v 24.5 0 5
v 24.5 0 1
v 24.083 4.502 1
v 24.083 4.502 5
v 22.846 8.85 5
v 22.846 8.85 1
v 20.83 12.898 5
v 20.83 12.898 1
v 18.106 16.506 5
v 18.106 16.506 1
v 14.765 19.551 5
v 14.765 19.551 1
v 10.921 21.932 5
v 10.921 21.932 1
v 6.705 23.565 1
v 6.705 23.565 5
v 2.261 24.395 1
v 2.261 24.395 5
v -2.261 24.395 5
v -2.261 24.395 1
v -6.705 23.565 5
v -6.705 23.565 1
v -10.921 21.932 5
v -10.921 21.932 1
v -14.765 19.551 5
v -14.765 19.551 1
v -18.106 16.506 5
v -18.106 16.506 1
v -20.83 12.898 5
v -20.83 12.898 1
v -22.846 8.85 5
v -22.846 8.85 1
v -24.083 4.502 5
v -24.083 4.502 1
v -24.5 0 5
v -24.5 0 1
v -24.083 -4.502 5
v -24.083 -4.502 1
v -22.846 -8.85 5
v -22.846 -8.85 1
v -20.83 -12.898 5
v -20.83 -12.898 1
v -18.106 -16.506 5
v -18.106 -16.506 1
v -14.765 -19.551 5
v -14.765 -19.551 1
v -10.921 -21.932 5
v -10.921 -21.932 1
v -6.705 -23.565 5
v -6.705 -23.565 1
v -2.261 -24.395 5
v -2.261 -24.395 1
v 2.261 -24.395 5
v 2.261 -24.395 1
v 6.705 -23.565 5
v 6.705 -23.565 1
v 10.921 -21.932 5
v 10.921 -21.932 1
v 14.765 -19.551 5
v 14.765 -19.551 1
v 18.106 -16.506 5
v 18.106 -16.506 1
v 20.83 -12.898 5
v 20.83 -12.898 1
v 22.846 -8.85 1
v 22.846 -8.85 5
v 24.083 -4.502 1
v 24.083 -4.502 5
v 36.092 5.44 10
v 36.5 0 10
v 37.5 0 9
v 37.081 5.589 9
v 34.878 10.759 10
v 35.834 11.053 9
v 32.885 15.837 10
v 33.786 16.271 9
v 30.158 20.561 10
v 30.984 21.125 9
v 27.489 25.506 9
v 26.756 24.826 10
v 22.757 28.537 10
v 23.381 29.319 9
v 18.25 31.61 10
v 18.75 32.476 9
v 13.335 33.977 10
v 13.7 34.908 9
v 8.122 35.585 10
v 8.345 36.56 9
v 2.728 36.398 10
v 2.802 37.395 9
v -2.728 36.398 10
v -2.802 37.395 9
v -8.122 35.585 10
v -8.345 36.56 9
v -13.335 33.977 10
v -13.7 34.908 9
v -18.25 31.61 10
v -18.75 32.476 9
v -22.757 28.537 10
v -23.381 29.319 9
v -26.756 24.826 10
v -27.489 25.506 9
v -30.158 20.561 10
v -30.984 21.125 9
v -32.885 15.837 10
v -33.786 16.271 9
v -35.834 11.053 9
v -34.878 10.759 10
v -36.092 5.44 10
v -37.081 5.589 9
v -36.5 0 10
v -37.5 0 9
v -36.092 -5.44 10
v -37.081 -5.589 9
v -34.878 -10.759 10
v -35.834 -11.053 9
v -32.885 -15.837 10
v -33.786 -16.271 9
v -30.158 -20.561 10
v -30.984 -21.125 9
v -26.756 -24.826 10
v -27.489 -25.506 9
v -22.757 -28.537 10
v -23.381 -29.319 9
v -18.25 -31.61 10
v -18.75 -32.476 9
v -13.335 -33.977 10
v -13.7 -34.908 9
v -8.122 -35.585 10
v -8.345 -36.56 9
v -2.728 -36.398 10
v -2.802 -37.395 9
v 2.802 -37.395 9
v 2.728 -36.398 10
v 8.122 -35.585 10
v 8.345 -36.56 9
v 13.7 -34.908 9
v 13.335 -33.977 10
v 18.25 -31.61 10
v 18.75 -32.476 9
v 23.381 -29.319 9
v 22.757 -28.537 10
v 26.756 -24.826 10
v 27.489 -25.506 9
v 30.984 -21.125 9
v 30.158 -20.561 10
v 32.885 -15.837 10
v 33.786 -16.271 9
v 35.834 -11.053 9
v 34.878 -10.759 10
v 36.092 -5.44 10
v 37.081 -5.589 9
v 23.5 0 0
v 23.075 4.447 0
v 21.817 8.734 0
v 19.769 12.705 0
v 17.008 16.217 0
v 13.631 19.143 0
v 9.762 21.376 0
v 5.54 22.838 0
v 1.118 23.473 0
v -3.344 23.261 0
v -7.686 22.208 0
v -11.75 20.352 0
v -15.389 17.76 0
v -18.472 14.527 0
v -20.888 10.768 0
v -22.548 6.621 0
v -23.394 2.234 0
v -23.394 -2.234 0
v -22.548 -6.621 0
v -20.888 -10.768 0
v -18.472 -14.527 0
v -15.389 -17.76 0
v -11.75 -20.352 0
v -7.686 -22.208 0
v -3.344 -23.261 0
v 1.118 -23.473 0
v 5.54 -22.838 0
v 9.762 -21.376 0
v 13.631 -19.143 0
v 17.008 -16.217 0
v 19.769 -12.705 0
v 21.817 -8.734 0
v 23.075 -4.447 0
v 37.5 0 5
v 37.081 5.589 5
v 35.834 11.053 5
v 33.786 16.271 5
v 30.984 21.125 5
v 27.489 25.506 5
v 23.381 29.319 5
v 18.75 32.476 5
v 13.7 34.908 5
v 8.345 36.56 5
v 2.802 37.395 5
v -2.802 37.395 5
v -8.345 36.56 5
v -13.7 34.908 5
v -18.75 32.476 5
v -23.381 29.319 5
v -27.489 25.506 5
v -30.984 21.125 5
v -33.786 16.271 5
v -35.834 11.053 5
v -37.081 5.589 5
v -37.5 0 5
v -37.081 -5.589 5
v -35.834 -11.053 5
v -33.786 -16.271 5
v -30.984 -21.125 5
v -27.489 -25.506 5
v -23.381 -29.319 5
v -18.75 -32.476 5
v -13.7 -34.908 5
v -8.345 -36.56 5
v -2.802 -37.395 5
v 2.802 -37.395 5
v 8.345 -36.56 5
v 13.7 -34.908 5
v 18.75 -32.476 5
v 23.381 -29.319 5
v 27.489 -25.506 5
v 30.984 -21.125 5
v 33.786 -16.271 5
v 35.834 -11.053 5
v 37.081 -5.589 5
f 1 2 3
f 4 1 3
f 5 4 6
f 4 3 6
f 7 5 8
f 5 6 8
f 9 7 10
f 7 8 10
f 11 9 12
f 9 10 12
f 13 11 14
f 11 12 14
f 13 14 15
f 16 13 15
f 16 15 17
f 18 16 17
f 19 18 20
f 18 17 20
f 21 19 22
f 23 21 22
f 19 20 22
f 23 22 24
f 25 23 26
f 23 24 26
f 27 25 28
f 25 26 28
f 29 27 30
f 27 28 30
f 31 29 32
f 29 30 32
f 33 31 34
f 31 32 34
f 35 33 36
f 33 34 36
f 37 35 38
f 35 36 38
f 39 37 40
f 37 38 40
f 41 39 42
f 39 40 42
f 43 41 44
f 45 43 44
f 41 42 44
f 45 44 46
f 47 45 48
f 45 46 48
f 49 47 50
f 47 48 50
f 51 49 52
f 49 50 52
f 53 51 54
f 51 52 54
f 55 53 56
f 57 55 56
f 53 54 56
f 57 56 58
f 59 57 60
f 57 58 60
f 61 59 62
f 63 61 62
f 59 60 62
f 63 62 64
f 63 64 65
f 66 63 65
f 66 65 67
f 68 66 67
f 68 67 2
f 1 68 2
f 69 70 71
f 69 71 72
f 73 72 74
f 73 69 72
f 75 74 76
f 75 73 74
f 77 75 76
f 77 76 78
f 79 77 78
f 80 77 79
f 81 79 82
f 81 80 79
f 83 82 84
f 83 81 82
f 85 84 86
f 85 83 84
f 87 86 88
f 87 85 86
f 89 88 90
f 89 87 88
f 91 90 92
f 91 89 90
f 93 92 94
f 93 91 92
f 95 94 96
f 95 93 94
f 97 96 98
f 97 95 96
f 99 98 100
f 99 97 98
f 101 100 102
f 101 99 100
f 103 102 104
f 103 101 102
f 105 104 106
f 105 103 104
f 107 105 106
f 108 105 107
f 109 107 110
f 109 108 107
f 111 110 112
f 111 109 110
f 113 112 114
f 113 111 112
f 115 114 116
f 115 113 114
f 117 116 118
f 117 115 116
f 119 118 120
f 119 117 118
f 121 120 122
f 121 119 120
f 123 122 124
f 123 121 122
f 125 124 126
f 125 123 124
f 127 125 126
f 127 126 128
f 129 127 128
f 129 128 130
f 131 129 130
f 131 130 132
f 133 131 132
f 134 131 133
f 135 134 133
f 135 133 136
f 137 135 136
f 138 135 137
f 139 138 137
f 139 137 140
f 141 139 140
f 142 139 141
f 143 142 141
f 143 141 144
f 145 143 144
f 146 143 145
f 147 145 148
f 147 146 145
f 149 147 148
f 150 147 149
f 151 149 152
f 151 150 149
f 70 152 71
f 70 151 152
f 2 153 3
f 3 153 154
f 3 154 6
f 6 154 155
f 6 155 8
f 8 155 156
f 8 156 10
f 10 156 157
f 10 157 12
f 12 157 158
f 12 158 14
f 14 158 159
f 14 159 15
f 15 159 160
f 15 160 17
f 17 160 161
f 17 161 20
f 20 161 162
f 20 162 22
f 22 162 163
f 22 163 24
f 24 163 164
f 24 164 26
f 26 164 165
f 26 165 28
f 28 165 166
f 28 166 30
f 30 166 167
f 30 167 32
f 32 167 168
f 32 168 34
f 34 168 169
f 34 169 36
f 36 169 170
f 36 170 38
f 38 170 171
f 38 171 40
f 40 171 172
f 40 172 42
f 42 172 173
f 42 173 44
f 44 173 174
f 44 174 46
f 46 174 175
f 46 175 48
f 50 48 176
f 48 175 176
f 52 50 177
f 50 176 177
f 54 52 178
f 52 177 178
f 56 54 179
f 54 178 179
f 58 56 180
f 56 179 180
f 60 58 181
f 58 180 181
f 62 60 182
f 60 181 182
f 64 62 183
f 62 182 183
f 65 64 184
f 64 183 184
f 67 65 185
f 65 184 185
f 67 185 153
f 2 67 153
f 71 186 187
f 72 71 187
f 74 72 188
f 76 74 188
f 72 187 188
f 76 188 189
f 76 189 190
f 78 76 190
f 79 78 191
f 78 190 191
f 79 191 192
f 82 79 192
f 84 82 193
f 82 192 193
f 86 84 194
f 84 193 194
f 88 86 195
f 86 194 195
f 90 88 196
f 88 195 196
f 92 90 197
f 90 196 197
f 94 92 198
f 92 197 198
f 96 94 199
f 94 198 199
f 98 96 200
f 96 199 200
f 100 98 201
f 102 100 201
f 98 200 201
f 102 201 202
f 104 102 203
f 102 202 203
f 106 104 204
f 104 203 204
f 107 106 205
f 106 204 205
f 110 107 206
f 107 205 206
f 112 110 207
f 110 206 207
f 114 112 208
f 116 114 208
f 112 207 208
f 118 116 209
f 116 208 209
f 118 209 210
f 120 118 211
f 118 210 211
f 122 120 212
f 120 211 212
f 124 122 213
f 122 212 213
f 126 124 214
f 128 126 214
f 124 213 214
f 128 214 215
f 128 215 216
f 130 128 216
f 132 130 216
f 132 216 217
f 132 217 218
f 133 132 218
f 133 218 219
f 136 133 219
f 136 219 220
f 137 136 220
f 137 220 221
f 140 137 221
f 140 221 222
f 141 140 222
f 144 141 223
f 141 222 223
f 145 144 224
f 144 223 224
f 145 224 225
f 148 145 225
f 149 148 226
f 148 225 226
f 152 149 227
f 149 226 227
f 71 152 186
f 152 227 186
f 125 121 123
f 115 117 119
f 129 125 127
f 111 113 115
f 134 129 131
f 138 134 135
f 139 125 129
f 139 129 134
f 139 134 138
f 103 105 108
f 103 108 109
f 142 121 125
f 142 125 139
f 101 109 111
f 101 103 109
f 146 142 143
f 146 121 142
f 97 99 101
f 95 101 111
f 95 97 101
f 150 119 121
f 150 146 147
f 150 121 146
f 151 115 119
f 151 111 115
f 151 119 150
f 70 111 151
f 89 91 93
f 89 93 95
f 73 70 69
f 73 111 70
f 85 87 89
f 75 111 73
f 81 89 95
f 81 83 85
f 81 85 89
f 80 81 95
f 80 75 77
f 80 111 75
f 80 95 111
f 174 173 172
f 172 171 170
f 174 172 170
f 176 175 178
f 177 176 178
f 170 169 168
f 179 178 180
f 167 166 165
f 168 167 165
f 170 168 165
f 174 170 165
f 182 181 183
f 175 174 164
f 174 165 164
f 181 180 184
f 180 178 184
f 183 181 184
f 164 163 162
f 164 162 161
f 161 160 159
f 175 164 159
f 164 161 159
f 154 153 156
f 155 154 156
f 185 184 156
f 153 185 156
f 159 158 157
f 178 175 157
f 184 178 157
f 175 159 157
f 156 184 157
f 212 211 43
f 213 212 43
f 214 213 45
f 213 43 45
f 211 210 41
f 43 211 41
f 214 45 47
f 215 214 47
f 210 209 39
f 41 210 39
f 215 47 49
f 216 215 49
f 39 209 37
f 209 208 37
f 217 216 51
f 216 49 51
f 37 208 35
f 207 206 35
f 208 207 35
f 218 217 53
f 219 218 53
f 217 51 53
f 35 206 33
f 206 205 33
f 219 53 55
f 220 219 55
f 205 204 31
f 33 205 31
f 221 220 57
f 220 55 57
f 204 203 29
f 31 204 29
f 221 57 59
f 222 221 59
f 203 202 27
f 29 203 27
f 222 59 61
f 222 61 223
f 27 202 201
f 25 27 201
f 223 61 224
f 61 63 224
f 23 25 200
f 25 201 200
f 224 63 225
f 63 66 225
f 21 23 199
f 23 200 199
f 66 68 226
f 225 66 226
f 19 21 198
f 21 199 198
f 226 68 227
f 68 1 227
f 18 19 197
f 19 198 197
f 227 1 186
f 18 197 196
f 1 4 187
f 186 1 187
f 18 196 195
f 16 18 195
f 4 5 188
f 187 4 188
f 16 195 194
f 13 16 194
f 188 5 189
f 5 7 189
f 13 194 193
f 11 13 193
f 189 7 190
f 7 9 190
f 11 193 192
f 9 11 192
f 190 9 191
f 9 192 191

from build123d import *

# Parameters (mm, degrees)
F0_R     = 24.5
F1_DEPTH = 5
F2_R     = 37.5
F2_R_2   = 24.5
F3_DEPTH = 5
F4_SIZE  = 1
F5_SIZE  = 1


with BuildPart() as f1:
    # F0 (on Top) → F1 (new body)
    with BuildSketch(Plane.XY):
        Circle(F0_R)
    extrude(amount=F1_DEPTH)

    # F2 (on face) → F3 (join)
    with BuildSketch(Plane.XY.offset(5)):
        Circle(F2_R)
        Circle(F2_R_2, mode=Mode.SUBTRACT)
        Circle(F2_R_2)
    extrude(amount=F3_DEPTH)

    # F4
    f4_edges = [f1.edges().sort_by_distance(p)[0] for p in [
        (-37.5, 0, 10),
    ]]
    chamfer(f4_edges, length=F4_SIZE)

    # F5
    f5_edges = [f1.edges().sort_by_distance(p)[0] for p in [
        (-24.5, 0, 0),
    ]]
    chamfer(f5_edges, length=F5_SIZE)


solid = f1.part
